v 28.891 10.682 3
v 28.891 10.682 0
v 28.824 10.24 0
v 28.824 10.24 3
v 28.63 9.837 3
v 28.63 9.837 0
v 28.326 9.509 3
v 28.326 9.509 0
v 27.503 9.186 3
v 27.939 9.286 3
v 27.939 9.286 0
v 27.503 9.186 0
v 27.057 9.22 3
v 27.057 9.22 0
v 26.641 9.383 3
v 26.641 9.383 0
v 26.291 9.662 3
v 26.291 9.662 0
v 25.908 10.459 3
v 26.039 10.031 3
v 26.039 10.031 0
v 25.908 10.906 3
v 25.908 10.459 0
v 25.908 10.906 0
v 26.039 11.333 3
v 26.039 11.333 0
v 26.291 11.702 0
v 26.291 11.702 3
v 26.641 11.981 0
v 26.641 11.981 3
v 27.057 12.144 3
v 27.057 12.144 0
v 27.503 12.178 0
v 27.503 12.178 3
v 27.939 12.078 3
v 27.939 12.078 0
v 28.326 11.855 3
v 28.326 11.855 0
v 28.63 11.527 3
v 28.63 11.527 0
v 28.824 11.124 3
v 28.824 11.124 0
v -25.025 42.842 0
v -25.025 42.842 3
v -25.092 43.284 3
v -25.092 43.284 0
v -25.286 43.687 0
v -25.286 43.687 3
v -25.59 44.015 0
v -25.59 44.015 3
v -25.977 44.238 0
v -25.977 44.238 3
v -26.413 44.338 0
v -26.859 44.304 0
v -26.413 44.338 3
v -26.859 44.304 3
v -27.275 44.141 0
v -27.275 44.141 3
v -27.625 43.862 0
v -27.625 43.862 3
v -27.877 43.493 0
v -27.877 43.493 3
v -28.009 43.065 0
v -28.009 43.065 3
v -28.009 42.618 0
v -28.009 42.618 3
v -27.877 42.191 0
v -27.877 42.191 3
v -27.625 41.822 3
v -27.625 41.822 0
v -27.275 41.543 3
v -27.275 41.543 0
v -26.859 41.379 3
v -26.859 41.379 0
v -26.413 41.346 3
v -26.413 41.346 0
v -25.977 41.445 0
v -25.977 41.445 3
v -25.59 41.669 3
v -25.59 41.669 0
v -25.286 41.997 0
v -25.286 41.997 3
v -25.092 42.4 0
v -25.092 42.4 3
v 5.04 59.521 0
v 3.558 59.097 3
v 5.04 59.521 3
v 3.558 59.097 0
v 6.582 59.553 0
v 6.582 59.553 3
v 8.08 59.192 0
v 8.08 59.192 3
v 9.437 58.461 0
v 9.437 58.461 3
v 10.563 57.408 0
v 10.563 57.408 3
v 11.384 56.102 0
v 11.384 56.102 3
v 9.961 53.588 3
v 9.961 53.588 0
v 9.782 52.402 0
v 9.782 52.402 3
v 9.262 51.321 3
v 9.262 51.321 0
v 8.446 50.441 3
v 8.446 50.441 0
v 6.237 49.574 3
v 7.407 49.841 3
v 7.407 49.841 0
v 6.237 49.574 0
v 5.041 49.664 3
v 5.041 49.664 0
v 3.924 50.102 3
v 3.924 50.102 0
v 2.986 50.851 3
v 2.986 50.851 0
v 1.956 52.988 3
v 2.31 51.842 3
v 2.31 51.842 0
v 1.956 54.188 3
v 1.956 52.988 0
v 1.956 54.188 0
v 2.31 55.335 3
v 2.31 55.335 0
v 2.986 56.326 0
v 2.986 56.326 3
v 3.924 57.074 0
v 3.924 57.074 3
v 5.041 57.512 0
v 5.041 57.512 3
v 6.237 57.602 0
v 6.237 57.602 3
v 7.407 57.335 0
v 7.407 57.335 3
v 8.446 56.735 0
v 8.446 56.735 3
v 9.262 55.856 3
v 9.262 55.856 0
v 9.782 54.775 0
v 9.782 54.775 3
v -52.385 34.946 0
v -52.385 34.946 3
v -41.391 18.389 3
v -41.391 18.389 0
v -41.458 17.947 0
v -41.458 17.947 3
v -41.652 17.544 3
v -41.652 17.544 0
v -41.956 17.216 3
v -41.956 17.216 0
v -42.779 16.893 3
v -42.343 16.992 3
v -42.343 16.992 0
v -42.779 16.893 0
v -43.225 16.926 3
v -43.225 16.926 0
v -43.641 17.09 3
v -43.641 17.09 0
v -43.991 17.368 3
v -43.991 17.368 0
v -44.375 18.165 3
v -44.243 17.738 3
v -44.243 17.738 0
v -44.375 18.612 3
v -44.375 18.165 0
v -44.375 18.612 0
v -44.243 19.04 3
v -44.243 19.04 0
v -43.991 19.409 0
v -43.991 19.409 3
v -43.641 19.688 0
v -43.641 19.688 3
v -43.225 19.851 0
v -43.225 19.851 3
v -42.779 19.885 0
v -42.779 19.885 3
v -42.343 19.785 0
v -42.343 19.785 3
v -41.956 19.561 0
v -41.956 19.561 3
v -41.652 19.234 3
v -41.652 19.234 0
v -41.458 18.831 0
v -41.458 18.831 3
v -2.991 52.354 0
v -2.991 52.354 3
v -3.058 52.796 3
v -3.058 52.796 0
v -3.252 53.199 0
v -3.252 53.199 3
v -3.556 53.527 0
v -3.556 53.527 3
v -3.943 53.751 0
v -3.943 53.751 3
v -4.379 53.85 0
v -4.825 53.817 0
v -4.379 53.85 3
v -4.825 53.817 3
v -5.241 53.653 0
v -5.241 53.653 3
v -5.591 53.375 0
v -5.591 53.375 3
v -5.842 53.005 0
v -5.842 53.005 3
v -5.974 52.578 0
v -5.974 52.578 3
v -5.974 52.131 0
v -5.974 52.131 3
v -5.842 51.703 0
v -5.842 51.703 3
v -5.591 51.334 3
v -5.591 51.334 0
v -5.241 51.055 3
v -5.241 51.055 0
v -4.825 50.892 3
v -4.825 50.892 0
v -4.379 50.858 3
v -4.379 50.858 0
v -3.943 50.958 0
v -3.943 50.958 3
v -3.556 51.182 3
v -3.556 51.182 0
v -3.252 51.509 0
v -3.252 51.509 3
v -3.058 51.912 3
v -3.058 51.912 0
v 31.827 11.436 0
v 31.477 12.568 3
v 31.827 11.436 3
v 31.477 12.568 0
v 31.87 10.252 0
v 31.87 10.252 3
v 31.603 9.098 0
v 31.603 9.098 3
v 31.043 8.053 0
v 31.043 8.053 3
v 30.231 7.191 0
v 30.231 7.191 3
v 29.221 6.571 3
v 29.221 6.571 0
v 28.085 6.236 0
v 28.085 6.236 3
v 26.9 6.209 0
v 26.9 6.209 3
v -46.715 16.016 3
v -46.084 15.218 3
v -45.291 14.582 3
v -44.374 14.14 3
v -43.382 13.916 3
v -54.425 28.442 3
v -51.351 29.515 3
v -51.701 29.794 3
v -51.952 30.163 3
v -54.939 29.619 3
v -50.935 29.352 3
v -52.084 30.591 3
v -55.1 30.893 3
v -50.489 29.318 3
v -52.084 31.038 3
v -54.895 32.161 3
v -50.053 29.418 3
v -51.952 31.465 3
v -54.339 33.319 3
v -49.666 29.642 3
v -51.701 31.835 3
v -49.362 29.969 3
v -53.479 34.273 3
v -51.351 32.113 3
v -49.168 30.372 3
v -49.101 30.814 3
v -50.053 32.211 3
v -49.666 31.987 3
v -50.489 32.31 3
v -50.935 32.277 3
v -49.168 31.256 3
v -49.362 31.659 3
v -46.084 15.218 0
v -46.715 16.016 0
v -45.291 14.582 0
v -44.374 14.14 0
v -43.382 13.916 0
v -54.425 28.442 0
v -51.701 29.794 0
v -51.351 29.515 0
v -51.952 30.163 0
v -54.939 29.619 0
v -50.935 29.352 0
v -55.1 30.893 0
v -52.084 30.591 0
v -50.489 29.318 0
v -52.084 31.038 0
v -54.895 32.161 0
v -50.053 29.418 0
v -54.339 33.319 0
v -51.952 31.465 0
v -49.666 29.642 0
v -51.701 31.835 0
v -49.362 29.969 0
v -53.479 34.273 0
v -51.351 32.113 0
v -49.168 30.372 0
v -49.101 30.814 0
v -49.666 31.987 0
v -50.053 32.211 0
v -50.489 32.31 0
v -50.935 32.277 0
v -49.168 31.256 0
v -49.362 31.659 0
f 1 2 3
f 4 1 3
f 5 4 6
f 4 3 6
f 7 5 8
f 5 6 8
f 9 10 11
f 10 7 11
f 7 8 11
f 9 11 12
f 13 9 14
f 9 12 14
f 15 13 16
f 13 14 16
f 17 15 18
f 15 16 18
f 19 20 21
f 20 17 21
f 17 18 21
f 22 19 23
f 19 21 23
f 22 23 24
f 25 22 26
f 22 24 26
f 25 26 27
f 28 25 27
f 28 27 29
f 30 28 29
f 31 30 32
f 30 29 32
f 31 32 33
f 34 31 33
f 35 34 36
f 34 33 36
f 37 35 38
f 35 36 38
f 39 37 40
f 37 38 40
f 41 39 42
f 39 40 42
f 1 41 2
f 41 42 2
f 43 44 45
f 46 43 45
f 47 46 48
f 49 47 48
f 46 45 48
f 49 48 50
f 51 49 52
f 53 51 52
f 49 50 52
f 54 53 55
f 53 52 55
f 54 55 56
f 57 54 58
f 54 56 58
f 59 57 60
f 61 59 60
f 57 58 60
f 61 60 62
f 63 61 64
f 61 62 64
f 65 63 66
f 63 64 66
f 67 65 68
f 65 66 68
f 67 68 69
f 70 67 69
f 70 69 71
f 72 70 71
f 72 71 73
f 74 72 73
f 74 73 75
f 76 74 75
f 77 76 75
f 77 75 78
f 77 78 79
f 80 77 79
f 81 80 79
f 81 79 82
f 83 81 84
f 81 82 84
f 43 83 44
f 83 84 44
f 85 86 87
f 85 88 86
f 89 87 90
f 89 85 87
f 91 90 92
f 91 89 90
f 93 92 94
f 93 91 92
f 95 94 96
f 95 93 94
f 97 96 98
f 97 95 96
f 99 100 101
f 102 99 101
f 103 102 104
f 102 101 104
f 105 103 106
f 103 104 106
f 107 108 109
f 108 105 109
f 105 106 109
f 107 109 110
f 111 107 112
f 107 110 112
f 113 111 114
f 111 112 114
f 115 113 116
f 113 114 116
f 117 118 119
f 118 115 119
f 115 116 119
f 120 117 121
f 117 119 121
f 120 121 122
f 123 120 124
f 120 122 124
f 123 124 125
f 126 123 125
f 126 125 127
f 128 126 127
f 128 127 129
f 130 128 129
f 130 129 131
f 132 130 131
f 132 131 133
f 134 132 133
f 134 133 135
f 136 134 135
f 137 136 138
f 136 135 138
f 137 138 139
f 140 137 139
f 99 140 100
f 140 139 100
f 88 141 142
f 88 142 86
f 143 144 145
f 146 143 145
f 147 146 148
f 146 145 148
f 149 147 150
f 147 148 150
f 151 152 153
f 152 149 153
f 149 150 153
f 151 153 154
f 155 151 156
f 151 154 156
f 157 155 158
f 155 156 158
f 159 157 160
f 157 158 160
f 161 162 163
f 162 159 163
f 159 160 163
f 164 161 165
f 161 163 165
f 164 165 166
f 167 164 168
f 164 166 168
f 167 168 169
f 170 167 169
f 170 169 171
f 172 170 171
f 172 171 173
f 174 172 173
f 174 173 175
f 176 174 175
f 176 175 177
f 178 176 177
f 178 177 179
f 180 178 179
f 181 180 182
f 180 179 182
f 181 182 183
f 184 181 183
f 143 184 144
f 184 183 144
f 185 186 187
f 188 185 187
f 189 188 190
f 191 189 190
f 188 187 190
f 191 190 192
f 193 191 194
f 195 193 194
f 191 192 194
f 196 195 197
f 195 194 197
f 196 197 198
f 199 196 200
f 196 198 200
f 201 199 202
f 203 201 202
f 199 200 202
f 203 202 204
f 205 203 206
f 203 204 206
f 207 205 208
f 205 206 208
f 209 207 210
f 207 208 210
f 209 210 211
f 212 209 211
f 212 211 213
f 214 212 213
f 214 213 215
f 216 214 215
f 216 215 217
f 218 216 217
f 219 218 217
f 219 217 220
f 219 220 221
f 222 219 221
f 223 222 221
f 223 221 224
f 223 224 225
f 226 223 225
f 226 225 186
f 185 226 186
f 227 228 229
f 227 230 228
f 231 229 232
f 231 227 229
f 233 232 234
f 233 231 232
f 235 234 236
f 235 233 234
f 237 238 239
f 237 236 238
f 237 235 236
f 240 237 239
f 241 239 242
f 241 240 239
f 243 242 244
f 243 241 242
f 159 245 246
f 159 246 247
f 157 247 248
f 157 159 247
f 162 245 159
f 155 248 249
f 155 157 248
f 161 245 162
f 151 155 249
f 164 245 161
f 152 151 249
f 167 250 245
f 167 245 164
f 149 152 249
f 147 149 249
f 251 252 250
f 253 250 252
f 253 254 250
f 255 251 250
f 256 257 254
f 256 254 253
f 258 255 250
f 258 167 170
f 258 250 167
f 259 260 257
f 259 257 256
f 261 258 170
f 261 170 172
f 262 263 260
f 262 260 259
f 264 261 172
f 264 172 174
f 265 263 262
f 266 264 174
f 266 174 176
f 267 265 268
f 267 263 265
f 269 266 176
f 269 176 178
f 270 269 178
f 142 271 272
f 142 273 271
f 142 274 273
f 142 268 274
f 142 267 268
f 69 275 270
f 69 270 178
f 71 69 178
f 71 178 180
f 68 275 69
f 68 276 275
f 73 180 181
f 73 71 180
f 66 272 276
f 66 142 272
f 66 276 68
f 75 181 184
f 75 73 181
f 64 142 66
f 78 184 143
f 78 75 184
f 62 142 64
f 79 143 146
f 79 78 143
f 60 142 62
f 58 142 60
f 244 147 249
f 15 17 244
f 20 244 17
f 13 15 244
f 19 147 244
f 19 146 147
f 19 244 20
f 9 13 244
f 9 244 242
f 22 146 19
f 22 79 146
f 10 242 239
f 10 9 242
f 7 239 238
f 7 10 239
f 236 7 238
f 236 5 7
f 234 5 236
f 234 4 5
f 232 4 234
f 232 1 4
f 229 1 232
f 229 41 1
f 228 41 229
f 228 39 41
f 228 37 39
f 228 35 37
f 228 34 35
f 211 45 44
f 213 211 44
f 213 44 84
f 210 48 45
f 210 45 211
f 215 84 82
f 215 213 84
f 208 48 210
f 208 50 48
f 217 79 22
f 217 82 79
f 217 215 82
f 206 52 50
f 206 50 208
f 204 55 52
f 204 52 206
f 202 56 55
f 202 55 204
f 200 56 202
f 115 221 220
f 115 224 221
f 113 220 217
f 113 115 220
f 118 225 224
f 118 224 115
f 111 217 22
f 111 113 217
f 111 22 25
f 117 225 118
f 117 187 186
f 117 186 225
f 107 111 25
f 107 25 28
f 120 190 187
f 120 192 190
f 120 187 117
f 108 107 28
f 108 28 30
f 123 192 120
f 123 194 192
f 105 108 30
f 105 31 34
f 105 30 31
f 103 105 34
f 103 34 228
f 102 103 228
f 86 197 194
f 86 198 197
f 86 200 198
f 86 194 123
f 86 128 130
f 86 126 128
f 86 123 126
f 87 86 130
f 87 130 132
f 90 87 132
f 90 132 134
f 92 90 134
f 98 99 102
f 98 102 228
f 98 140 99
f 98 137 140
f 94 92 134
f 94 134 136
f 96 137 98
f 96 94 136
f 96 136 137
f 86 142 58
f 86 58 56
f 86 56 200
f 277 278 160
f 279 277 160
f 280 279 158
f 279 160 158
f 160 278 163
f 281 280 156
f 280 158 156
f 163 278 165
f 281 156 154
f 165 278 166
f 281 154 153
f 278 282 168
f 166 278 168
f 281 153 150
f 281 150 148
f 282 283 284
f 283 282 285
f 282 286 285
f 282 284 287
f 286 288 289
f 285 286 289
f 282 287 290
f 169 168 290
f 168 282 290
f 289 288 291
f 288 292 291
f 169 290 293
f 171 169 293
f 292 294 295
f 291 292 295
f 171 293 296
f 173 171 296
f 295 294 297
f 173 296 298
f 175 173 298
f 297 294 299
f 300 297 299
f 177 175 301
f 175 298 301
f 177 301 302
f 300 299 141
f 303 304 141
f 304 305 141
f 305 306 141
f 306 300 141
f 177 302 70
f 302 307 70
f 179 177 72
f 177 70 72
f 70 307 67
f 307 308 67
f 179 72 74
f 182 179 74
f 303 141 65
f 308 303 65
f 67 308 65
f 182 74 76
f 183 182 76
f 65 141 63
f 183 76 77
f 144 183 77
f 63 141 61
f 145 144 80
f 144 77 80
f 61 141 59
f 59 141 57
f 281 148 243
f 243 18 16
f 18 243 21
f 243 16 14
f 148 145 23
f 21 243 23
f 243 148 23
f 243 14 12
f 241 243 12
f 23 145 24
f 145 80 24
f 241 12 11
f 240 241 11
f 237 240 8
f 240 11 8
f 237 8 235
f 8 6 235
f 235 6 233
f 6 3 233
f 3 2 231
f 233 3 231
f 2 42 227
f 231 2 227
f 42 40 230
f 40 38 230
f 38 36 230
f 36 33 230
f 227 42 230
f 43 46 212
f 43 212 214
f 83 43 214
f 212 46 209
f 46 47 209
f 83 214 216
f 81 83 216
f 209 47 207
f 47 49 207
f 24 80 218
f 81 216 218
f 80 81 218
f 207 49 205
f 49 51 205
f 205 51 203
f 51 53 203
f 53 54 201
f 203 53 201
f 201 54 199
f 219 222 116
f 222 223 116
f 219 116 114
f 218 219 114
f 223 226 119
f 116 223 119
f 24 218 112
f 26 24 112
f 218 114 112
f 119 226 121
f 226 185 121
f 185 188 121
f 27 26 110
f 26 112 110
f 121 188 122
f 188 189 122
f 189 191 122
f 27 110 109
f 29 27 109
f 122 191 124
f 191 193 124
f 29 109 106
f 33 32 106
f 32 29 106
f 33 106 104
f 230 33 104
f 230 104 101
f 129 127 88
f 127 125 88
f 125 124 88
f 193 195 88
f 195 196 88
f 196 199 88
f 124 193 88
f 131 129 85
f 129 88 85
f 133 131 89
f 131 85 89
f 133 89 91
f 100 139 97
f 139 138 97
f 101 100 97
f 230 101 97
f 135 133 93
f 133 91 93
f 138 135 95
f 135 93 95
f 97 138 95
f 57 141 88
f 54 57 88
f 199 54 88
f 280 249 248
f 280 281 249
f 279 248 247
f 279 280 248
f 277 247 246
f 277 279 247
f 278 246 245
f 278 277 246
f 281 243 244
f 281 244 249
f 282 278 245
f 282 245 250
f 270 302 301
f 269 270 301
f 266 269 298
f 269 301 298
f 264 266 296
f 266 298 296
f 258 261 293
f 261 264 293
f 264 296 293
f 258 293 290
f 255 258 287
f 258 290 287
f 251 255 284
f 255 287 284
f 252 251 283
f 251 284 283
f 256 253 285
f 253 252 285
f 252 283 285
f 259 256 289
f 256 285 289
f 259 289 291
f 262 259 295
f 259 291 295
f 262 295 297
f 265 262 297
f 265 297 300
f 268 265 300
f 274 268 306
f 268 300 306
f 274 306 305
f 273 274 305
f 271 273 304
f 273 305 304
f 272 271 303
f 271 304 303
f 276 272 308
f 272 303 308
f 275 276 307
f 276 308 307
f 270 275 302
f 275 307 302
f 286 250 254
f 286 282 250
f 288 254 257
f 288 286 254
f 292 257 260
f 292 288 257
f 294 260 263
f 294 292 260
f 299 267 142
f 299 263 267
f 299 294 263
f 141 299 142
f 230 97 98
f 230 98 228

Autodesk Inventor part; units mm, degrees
ref_plane "YZ Plane" through (0, 0, 0) normal (1, 0, 0) x (0, 1, 0)
ref_plane "XZ Plane" through (0, 0, 0) normal (0, 1, 0) x (-1, 0, 0)
ref_plane "XY Plane" through (0, 0, 0) normal (0, 0, 1) x (1, 0, 0)
sketch "スケッチ1" plane through (0, 0, 0) normal (0, 0, 1) x (1, 0, 0)
  circle A0 centre (0, 0) radius 20.55 construction
  circle A1 centre (-21.6908, -16.4118) radius 19.1 construction
  circle A2 centre (25.3202, -9.9362) radius 19.1 construction
  circle A3 centre (-50.601, 30.8143) radius 1.5
  circle A4 centre (5.9362, 53.5882) radius 1.5
  circle A5 centre (27.3908, 10.6821) radius 1.5
  circle A6 centre (-42.8914, 18.3887) radius 1.5
  circle A7 centre (-21.6908, -16.4118) radius 4.025
  circle A8 centre (25.3202, -9.9362) radius 4.025
  circle A9 centre (0, 0) radius 4
  line L0 (-17.8785, -18.8026) -> (-30.4168, -38.7963) construction
  arc A10 (-17.8785, -18.8026) -> (-19.2493, -12.6317) centre (-21.6908, -16.4118) ccw construction
  line L1 (-19.2493, -12.6317) -> (-39.0737, 0.1727) construction
  line L2 (37.1409, -30.8522) -> (21.8866, -12.8448) construction
  arc A11 (22.3659, -6.5417) -> (21.8866, -12.8448) centre (25.3202, -9.9362) ccw construction
  line L3 (22.3659, -6.5417) -> (40.1678, 8.9519) construction
  line L4 (-21.6908, -16.4118) -> (-99.9742, 13.5882) construction
  line L5 (-105.5257, -16.4118) -> (-21.6908, -16.4118) construction
  line L6 (-21.6908, -16.4118) -> (-101.7113, -41.4118) construction
  line L7 (25.3202, -9.9362) -> (102.5386, -46.4118) construction
  line L8 (110.4743, -16.4118) -> (25.3202, -9.9362) construction
  line L9 (25.3202, -9.9362) -> (108.6869, 8.5882) construction
  line L10 (-18.0583, -13.7557) -> (-31.9879, 5.2949) construction
  line L11 (-17.339, -17.5569) -> (-24.5367, -44.9106) construction
  line L12 (21.5077, -7.5456) -> (34.045, 12.4488) construction
  line L13 (21.0739, -11.4259) -> (31.6059, -41.446) construction
  arc A12 (-24.6176, -40.3201) -> (-19.5065, -44.4166) centre (-20.132, -39.9603) ccw
  circle A13 centre (-20.132, -39.9603) radius 3 construction
  arc A14 (-38.9879, 7.9907) -> (-39.3359, 8.5262) centre (-35.3982, 10.7044) ccw construction
  circle A15 centre (-35.3982, 10.7044) radius 3 construction
  arc A16 (-31.9879, 5.2949) -> (-33.8465, 6.7744) centre (-35.6204, 2.6388) ccw construction
  circle A17 centre (-41.5152, -3.6073) radius 1.5
  line L14 (-33.8465, 6.7744) -> (-56.066, 16.3055) construction
  line L15 (-41.3386, 0.8892) -> (-72.6317, 2.1181) construction
  circle A18 centre (-42.8914, 18.3887) radius 3 construction
  circle A19 centre (-35.3982, 10.7044) radius 1.5
  circle A20 centre (36.7736, 17.5344) radius 1.5
  arc A21 (40.7942, 15.5132) -> (40.1934, 20.4593) centre (36.7736, 17.5344) ccw
  circle A22 centre (25.6508, -33.5339) radius 1.5
  arc A23 (26.2763, -37.9902) -> (30.1508, -33.5178) centre (25.6508, -33.5339) ccw
  circle A24 centre (36.7736, 17.5344) radius 3 construction
  circle A25 centre (25.6508, -33.5339) radius 3 construction
  arc A26 (36.6836, 14.4025) -> (34.045, 12.4488) centre (37.8575, 10.0583) ccw construction
  line L16 (36.6836, 14.4025) -> (64.1968, 21.8369) construction
  line L17 (43.2599, 10.0553) -> (82.9273, 8.8396) construction
  circle A27 centre (27.3908, 10.6821) radius 3 construction
  circle A28 centre (-21.6908, -16.4118) radius 7.025 construction
  circle A29 centre (25.3202, -9.9362) radius 7.025 construction
  arc A30 (40.8593, 15.6483) -> (30.1508, -33.5178) centre (146.4685, -33.1029) ccw
  arc A31 (-24.6176, -40.3201) -> (-39.1827, 8.2484) centre (-145.1158, -49.988) ccw
  arc A32 (-52.2824, 34.9884) -> (-54.1907, 28.1005) centre (-50.601, 30.8143) ccw
  arc A33 (9.356, 56.5132) -> (4.2549, 57.7623) centre (5.9362, 53.5882) ccw
  line L18 (-39.1827, 8.2484) -> (-54.1907, 28.1005)
  line L19 (-52.2824, 34.9884) -> (4.2549, 57.7623)
  line L20 (9.356, 56.5132) -> (40.1934, 20.4593)
  line L21 (-19.5065, -44.4166) -> (26.2763, -37.9902)
  circle A34 centre (-20.132, -39.9603) radius 1.5
  line L22 (-23.8868, -42.4405) -> (-17.339, -17.5569)
  arc A35 (-17.339, -17.5569) -> (-18.0583, -13.7557) centre (-21.6908, -16.4118) ccw
  line L23 (-18.0583, -13.7557) -> (-31.9879, 5.2949)
  arc A36 (-31.9879, 5.2949) -> (-33.8465, 6.7744) centre (-35.6204, 2.6388) ccw
  line L24 (-33.8465, 6.7744) -> (-40.0946, 9.4545)
  line L25 (40.7974, 15.5141) -> (36.6836, 14.4025)
  arc A37 (36.6836, 14.4025) -> (34.045, 12.4488) centre (37.8575, 10.0583) ccw
  line L26 (34.045, 12.4488) -> (21.5077, -7.5456)
  arc A38 (21.5077, -7.5456) -> (21.0739, -11.4259) centre (25.3202, -9.9362) ccw
  line L27 (21.0739, -11.4259) -> (29.592, -35.7057)
  dimension "d0" = 8.05
  dimension "d1" = 8.05
  dimension "d2" = 8
  dimension "d3" = 20.968
  dimension "d4" = 20.968
  dimension "d5" = 17.35
  dimension "d6" = 17.35
  dimension "d7" = 16.877
  dimension "d8" = 16.877
  dimension "d9" = 20.936
  dimension "d10" = 20.936
  dimension "d11" = 9
  dimension "d12" = 6
  dimension "d13" = 9
  dimension "d14" = 6
  dimension "d15" = 9
  dimension "d16" = 20.968
  dimension "d17" = 20.968
  dimension "d18" = 6
  dimension "d19" = 3
  dimension "d20" = 3
  dimension "d21" = 9
  dimension "d22" = 3
  dimension "d23" = 9
  dimension "d24" = 6
  dimension "d25" = 6
  dimension "d26" = 9
  dimension "d27" = 16.877
  dimension "d28" = 3
  dimension "d29" = 3
  dimension "d30" = 9
  dimension "d31" = 9
  dimension "d32" = 3
sketch "スケッチ2" plane through (0, 0, 0) normal (0, 0, 1) x (1, 0, 0)
  circle A0 centre (-50.601, 30.8143) radius 1.5 projected
  circle A1 centre (-42.8914, 18.3887) radius 1.5 projected
  circle A2 centre (5.9362, 53.5882) radius 1.5 projected
  circle A3 centre (27.3908, 10.6821) radius 1.5 projected
  arc A4 (-52.3846, 34.9457) -> (-54.4248, 28.4418) centre (-50.601, 30.8143) ccw
  arc A5 (-46.7151, 16.0162) -> (-43.3819, 13.9155) centre (-42.8914, 18.3887) ccw
  arc A6 (11.384, 56.1025) -> (3.5581, 59.0968) centre (5.9362, 53.5882) ccw
  arc A7 (26.9003, 6.2089) -> (31.4766, 12.5678) centre (27.3908, 10.6821) ccw
  line L0 (-46.7151, 16.0162) -> (-54.4248, 28.4418)
  line L1 (-52.3846, 34.9457) -> (3.5581, 59.0968)
  line L2 (11.384, 56.1025) -> (31.4766, 12.5678)
  line L3 (26.9003, 6.2089) -> (-43.3819, 13.9155)
  circle A8 centre (5.9362, 53.5882) radius 4.025
  point P0 (0, 0)
  dimension "d33" = 3
  dimension "d34" = 3
  dimension "d35" = 4.5
  dimension "d36" = 3
  dimension "d39" = 8.05
extrude "押し出し1" add sketch "スケッチ2" along normal blind 3 contours L1 A6 L2 A7 L3 A5 L0 A4
sketch "スケッチ3" plane through (0, 0, 3) normal (0, 0, 1) x (1, 0, 0)
  circle A0 centre (5.9362, 53.5882) radius 4.025 projected
  circle A1 centre (27.3908, 10.6821) radius 1.5 projected
  circle A2 centre (-42.8914, 18.3887) radius 1.5 projected
  circle A3 centre (-50.601, 30.8143) radius 1.5 projected
  line L0 (-54.4248, 28.4418) -> (-46.7151, 16.0162) projected
  arc A4 (-46.7151, 16.0162) -> (-43.3819, 13.9155) centre (-42.8914, 18.3887) ccw projected
  line L1 (-43.3819, 13.9155) -> (26.9003, 6.2089) projected
  arc A5 (26.9003, 6.2089) -> (31.4766, 12.5678) centre (27.3908, 10.6821) ccw projected
  line L2 (31.4766, 12.5678) -> (11.384, 56.1025) projected
  arc A6 (11.384, 56.1025) -> (3.5581, 59.0968) centre (5.9362, 53.5882) ccw projected
  line L3 (3.5581, 59.0968) -> (-52.3846, 34.9457) projected
  arc A7 (-52.3846, 34.9457) -> (-54.4248, 28.4418) centre (-50.601, 30.8143) ccw projected
  circle A8 centre (5.9362, 53.5882) radius 6
  circle A9 centre (-26.5254, 42.8418) radius 1.5
  circle A10 centre (-4.491, 52.3543) radius 1.5
  circle A11 centre (-4.491, 52.3543) radius 4.5 construction
  point P0 (0, 0)
  dimension "d40" = 12
  dimension "d41" = 3
  dimension "d42" = 3
  dimension "d43" = 3
  dimension "d44" = 3
  dimension "d45" = 24
  dimension "d46" = 9
extrude "押し出し2" cut sketch "スケッチ3" against normal blind 10 contours A9 | A10
equation "\"d4\" = d3"
equation "\"d6\" = d5"
equation "\"d8\" = d7"
equation "\"d10\" = d9"
equation "\"d16\" = d3"
equation "\"d17\" = d3"
equation "\"d27\" = d7"
properties part number "中間外フレーム2" material "ポリカーボネート、クリア"
